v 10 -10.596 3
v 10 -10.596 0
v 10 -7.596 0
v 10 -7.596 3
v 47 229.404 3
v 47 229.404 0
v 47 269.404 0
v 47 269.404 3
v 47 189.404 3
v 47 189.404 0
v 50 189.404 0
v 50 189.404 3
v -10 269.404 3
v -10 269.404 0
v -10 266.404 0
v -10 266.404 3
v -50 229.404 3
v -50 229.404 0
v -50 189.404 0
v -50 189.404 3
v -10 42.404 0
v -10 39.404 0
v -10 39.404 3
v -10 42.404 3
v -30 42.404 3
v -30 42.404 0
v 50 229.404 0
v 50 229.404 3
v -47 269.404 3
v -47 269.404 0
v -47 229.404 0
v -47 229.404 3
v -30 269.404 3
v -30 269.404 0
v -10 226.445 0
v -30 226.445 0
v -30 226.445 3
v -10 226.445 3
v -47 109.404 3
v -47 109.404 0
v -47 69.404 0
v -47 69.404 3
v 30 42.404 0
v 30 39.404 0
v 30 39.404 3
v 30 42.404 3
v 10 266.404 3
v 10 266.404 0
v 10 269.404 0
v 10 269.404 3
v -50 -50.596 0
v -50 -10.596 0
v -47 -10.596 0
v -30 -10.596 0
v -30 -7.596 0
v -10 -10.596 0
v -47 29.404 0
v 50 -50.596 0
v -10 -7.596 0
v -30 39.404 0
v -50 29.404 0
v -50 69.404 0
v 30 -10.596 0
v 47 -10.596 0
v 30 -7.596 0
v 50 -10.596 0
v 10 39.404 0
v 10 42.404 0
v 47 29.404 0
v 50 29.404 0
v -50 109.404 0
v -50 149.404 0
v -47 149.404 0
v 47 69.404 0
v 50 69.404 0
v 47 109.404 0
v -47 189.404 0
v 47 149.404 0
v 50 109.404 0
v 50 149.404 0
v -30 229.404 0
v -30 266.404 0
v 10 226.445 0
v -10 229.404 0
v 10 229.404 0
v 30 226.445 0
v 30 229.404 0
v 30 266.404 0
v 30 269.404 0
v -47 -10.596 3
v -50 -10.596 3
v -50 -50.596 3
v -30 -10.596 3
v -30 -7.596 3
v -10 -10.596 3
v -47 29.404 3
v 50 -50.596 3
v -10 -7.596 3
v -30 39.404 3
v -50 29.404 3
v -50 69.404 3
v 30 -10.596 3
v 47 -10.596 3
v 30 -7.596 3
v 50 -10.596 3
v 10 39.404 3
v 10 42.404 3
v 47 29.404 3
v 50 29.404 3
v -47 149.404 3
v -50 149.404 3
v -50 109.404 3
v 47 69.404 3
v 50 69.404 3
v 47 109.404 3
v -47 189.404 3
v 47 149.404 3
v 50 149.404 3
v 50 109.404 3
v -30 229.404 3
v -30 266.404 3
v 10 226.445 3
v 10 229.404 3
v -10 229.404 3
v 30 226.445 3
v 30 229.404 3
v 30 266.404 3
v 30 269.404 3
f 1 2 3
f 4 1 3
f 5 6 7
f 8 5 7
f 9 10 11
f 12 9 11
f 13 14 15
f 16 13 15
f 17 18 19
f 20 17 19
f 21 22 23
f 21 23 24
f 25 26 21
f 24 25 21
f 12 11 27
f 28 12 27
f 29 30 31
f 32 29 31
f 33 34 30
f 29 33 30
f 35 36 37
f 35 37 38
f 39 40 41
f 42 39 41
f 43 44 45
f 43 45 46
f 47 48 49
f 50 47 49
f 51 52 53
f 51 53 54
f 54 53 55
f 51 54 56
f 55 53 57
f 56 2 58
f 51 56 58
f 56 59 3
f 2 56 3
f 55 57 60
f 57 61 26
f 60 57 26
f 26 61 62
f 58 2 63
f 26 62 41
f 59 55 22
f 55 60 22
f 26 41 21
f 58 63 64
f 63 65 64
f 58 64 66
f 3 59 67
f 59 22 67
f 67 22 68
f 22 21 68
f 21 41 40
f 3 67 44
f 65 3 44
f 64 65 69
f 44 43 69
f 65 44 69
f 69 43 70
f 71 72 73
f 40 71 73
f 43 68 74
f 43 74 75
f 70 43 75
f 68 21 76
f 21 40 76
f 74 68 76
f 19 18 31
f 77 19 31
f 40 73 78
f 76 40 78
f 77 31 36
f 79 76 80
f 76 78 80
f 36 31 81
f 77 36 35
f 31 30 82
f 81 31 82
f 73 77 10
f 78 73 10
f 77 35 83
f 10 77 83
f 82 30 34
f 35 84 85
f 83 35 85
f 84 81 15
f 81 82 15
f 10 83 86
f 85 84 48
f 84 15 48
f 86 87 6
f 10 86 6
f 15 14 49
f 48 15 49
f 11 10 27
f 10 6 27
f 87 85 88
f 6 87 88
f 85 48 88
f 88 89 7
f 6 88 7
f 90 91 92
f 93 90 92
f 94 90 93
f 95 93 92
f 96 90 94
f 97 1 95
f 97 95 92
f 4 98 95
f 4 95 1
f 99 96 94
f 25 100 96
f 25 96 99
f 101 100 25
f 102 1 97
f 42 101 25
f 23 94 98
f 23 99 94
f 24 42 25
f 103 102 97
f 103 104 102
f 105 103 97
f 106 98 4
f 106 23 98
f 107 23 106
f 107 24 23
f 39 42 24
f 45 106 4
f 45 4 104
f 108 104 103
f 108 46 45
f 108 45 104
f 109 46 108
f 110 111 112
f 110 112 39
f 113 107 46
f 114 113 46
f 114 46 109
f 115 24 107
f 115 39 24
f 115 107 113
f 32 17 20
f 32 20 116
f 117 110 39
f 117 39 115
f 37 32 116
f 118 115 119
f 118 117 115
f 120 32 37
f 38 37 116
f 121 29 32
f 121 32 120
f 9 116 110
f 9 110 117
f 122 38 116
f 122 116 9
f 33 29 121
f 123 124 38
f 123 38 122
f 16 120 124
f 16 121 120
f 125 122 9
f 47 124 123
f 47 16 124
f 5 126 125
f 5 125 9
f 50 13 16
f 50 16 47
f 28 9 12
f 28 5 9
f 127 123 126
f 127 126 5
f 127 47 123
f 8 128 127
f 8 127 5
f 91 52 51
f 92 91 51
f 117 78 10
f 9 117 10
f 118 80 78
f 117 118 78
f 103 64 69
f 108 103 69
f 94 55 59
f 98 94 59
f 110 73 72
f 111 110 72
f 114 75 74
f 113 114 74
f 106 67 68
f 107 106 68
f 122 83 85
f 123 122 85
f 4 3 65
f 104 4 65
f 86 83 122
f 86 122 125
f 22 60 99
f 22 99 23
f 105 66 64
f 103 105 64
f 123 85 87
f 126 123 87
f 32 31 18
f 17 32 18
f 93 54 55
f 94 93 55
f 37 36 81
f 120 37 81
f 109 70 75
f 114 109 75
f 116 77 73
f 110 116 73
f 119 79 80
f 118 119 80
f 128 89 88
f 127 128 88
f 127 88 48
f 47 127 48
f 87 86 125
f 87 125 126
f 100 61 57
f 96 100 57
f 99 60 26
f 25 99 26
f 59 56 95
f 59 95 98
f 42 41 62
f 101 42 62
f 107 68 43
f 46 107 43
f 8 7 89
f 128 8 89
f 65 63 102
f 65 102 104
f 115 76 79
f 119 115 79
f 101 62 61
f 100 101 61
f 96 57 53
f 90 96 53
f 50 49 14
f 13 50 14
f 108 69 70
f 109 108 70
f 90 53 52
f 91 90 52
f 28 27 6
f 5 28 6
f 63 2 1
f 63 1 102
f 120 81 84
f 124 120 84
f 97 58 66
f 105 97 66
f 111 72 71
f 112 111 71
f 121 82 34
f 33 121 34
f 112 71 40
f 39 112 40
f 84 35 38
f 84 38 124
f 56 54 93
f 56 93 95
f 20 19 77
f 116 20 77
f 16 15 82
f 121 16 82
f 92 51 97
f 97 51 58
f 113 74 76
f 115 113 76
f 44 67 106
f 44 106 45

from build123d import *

# Parameters (mm, degrees)
SKETCH_1_W      = 20
SKETCH_1_H      = 3
SKETCH_1_H_2    = 2.958752526
EXTRUDE_1_DEPTH = 3


with BuildPart() as part:
    # 草图1 → 凸台-拉伸1 (new body)
    with BuildSketch(Plane.XY):
        Polygon((50, -50.59602649), (50, -10.59602649), (47, -10.59602649), (47, 29.40397351), (50, 29.40397351), (50, 69.40397351), (47, 69.40397351), (47, 109.40397351), (50, 109.40397351), (50, 149.40397351), (47, 149.40397351), (47, 189.40397351), (50, 189.40397351), (50, 229.40397351), (47, 229.40397351), (47, 269.40397351), (30, 269.40397351), (30, 266.40397351), (10, 266.40397351), (10, 269.40397351), (-10, 269.40397351), (-10, 266.40397351), (-30, 266.40397351), (-30, 269.40397351), (-47, 269.40397351), (-47, 229.40397351), (-50, 229.40397351), (-50, 189.40397351), (-47, 189.40397351), (-47, 149.40397351), (-50, 149.40397351), (-50, 109.40397351), (-47, 109.40397351), (-47, 69.40397351), (-50, 69.40397351), (-50, 29.40397351), (-47, 29.40397351), (-47, -10.59602649), (-50, -10.59602649), (-50, -50.59602649), align=None)
        with Locations((-20, 40.90397351)):
            Rectangle(SKETCH_1_W, SKETCH_1_H, mode=Mode.SUBTRACT)
        with Locations((-20, -9.09602649)):
            Rectangle(SKETCH_1_W, SKETCH_1_H, mode=Mode.SUBTRACT)
        with Locations((20, 40.90397351)):
            Rectangle(SKETCH_1_W, SKETCH_1_H, mode=Mode.SUBTRACT)
        with Locations((20, -9.09602649)):
            Rectangle(SKETCH_1_W, SKETCH_1_H, mode=Mode.SUBTRACT)
        with Locations((-20, 227.924597247)):
            Rectangle(SKETCH_1_W, SKETCH_1_H_2, mode=Mode.SUBTRACT)
        with Locations((20, 227.924597247)):
            Rectangle(SKETCH_1_W, SKETCH_1_H_2, mode=Mode.SUBTRACT)
    extrude(amount=EXTRUDE_1_DEPTH)


solid = part.part
